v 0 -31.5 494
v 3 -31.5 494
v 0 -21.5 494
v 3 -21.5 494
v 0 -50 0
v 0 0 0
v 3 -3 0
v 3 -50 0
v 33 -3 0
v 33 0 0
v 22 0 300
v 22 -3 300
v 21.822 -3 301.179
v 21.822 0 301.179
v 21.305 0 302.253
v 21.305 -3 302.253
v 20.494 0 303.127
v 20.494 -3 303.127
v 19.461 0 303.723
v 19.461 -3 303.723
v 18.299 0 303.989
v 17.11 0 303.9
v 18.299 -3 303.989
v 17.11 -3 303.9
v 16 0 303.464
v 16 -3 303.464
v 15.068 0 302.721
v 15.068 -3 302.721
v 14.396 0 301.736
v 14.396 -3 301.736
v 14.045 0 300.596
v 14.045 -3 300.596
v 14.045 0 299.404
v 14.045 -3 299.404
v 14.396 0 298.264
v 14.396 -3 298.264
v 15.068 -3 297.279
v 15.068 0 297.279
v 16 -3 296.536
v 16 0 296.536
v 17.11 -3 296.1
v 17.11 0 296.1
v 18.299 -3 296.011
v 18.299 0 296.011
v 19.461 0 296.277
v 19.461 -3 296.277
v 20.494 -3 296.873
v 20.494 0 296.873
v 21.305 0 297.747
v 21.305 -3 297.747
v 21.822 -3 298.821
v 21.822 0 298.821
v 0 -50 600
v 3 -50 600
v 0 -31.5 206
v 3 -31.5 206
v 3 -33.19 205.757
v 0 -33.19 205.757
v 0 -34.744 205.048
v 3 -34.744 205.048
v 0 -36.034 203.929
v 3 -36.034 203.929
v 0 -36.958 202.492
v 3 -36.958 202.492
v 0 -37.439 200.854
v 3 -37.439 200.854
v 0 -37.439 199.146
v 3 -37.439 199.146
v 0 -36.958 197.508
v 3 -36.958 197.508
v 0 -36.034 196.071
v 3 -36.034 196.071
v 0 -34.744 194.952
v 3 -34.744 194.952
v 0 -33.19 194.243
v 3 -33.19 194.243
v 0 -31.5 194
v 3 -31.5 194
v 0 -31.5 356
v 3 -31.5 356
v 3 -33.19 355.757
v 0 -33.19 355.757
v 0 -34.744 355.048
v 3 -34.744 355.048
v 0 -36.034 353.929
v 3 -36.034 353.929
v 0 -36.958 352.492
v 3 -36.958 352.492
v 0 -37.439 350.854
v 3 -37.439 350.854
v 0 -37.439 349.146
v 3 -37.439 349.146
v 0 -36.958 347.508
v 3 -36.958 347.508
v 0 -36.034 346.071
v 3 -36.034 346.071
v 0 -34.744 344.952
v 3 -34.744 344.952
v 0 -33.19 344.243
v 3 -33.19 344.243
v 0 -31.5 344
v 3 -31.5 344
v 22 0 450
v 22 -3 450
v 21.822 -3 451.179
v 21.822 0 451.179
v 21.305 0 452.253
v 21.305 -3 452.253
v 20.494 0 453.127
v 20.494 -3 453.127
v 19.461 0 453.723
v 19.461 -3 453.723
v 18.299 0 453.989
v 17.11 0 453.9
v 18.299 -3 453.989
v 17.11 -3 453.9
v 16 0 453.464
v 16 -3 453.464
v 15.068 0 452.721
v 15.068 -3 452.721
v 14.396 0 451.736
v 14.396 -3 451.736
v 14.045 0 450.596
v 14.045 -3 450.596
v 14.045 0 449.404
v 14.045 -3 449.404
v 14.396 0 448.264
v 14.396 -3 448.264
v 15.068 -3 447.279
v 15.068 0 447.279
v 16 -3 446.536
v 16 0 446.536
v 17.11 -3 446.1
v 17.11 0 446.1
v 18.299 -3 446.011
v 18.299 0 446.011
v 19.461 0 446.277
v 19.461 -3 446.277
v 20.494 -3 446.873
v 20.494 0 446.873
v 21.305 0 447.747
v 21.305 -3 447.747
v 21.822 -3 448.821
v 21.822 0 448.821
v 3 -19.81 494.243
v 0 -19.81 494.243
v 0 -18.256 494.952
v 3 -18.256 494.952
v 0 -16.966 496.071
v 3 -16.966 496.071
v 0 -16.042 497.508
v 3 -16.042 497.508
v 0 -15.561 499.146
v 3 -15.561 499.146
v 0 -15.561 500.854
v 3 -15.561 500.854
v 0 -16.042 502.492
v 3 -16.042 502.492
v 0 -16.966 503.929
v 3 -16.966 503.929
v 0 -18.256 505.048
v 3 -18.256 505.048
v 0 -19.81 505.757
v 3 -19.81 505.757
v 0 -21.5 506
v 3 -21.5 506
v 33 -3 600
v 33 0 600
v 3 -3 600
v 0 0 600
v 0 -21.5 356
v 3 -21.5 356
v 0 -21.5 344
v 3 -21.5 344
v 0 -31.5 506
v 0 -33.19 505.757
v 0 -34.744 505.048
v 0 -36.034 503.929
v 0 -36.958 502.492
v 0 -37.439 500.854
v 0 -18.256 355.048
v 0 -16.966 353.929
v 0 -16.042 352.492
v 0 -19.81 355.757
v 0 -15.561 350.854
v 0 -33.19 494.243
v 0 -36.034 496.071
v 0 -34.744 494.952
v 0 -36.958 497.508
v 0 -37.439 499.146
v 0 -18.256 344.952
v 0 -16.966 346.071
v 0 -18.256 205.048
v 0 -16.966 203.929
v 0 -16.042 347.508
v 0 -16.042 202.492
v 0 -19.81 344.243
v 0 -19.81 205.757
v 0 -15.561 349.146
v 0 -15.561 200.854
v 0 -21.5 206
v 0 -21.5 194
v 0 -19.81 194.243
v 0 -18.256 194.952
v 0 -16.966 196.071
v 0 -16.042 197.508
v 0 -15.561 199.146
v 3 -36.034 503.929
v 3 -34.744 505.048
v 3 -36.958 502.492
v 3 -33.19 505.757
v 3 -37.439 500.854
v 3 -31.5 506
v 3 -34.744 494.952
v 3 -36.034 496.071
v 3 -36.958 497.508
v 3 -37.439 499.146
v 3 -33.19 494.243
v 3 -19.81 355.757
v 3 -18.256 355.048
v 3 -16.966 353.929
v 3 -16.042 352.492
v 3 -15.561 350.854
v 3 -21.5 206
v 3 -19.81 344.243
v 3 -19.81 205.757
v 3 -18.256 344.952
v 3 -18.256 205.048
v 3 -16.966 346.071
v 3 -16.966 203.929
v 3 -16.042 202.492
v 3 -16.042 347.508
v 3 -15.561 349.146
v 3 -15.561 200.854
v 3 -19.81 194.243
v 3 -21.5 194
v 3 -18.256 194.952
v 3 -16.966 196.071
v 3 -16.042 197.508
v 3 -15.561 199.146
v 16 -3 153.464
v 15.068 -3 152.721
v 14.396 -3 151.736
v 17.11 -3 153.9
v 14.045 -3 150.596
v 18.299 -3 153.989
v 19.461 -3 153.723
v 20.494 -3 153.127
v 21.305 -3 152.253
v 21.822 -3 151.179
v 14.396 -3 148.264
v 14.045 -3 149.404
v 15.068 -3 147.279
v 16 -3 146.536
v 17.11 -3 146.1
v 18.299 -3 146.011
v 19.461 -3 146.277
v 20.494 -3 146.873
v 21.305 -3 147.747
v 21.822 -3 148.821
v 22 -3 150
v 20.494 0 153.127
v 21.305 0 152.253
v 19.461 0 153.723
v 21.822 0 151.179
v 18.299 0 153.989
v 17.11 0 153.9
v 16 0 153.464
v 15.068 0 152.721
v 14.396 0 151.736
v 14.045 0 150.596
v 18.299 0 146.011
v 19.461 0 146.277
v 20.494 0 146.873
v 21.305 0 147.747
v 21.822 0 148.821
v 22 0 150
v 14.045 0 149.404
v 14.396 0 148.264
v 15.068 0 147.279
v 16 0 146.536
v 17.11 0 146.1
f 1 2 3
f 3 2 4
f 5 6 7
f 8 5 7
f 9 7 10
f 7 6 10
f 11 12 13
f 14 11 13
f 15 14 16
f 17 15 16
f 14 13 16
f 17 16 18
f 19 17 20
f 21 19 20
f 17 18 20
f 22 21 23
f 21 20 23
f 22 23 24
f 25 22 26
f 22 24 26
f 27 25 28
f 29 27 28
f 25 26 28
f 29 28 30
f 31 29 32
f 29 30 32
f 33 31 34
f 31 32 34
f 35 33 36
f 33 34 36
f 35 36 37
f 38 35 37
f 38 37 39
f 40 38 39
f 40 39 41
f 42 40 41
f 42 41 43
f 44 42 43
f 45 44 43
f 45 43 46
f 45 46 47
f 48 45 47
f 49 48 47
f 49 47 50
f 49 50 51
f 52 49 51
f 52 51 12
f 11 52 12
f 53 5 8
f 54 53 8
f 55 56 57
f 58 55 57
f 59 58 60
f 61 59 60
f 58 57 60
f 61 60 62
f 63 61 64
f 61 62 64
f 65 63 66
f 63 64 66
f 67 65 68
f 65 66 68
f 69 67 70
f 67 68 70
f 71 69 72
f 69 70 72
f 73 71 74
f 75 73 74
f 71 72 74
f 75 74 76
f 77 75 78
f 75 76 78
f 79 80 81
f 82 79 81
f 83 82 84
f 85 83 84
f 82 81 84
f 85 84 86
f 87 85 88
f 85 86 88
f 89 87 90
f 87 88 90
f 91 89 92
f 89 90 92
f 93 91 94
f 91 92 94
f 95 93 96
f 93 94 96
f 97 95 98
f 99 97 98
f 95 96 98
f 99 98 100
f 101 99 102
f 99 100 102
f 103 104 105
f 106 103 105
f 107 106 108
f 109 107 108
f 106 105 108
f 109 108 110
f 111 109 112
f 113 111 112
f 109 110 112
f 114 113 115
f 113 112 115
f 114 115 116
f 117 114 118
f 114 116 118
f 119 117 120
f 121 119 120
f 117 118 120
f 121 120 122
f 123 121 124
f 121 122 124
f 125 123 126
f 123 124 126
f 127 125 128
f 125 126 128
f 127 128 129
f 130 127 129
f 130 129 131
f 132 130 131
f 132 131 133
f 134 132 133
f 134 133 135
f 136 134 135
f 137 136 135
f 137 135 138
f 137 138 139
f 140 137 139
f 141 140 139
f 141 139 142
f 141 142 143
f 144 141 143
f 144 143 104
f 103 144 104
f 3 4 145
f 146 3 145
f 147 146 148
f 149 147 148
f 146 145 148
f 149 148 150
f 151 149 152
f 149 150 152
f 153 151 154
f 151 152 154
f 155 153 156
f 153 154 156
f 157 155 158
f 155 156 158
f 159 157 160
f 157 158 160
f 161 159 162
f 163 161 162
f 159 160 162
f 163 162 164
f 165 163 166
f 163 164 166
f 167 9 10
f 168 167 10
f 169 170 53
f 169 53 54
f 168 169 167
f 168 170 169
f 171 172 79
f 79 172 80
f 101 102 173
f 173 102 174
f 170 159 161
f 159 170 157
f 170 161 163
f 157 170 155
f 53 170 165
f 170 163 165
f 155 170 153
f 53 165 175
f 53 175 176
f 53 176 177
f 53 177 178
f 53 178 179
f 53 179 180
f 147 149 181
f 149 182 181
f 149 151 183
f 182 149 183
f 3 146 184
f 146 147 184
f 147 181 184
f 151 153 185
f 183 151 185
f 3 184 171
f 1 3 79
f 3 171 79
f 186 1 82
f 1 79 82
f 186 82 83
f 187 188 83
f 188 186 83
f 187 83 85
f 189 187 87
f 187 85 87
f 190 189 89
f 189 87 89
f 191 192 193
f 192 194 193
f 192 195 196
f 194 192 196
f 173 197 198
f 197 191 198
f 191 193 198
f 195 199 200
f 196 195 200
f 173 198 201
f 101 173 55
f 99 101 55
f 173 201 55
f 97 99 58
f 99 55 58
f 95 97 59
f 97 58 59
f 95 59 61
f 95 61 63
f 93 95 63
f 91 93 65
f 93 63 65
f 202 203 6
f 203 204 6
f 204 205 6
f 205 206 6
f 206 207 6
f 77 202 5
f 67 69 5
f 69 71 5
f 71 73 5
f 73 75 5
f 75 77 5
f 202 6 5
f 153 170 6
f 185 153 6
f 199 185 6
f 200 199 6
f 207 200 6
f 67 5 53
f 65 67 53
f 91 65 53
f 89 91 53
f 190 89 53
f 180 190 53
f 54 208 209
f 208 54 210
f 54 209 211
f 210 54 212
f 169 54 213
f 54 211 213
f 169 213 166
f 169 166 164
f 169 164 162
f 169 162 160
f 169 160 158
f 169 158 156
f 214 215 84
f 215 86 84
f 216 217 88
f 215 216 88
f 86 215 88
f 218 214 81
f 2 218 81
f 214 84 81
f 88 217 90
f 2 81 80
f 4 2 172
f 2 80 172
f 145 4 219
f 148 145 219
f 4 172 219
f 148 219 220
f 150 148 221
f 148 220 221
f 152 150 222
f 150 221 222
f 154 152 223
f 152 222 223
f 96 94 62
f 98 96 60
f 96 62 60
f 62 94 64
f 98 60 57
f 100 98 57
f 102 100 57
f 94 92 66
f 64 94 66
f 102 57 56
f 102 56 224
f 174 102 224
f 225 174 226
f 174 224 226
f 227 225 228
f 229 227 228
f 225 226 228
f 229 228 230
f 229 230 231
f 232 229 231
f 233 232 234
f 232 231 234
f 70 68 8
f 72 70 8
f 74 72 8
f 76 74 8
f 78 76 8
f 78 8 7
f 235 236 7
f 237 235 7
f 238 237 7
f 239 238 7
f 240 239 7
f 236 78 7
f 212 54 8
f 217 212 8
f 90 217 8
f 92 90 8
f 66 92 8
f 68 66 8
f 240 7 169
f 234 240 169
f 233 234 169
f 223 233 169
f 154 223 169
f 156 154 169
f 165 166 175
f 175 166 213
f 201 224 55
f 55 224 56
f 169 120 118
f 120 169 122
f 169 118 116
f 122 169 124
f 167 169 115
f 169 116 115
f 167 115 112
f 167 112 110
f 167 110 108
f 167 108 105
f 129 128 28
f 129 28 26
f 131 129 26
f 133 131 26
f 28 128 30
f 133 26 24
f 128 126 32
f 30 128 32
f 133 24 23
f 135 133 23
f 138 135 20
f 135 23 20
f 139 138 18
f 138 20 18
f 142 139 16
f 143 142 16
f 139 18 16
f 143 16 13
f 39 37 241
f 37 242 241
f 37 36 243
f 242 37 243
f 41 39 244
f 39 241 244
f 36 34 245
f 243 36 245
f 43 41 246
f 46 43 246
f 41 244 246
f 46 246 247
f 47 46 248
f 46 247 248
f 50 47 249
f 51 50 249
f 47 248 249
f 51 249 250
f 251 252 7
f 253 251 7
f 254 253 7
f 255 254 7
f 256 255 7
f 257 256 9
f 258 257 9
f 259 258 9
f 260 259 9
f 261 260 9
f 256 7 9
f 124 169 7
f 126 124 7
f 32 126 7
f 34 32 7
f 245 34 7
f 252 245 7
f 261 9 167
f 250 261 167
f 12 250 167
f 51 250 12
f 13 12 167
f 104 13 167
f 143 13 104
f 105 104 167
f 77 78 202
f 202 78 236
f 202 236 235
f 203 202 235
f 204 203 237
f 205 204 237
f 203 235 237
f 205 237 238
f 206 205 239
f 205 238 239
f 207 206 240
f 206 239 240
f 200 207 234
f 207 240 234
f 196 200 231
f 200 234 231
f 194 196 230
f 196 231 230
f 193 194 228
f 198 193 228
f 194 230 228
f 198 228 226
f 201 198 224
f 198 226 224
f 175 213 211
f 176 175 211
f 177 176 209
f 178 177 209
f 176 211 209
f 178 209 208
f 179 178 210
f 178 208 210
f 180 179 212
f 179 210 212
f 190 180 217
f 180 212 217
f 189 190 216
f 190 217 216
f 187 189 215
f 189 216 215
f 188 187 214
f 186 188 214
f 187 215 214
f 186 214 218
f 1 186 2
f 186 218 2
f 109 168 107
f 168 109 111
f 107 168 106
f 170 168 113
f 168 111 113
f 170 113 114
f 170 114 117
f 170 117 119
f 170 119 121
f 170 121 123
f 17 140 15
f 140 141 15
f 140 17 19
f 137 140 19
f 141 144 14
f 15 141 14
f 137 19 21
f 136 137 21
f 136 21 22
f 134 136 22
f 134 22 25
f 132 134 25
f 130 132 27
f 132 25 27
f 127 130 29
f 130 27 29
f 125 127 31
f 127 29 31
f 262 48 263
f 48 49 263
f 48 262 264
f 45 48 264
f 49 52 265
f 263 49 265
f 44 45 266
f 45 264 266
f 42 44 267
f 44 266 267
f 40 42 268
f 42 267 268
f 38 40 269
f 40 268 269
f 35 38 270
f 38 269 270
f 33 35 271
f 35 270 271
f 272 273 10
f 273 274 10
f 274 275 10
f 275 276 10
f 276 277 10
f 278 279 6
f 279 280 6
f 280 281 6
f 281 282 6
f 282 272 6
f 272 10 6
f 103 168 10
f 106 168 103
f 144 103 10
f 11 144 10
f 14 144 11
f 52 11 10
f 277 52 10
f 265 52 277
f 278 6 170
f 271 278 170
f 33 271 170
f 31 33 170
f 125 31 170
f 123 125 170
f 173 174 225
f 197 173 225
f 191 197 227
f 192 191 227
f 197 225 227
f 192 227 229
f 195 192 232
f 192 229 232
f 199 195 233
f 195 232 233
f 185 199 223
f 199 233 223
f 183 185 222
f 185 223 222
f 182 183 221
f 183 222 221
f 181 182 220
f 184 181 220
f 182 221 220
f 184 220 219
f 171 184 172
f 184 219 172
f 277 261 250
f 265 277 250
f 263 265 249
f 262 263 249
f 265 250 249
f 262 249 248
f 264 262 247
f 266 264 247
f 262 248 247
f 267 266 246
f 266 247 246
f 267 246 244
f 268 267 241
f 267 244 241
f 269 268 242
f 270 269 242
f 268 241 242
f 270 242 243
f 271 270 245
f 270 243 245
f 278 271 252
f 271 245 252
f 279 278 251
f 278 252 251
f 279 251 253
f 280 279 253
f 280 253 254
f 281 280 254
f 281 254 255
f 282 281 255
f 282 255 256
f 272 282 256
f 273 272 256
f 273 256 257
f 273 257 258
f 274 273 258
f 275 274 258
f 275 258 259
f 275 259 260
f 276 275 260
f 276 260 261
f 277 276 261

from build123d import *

# Parameters (mm, degrees)
F1_DEPTH = 600
F2_R     = 4
F3_DEPTH = 3.001
F5_DEPTH = 3.001


with BuildPart() as f1:
    # F0 (on Top) → F1 (new body)
    with BuildSketch(Plane.XY):
        Polygon((33, 0), (0, 0), (0, -50), (3, -50), (3, -3), (33, -3), align=None)
    extrude(amount=F1_DEPTH)

    # F2 (on face) → F3 (cut, through all)
    with BuildSketch(Plane.XZ.offset(3)):
        with Locations((18, 150)):
            Circle(F2_R)
        with Locations((18, 300)):
            Circle(F2_R)
        with Locations((18, 450)):
            Circle(F2_R)
    extrude(amount=-F3_DEPTH, mode=Mode.SUBTRACT)

    # F4 (on face) → F5 (cut, through all)
    with BuildSketch(Plane.YZ.offset(3)):
        with BuildLine():
            Line((-21.5, 506), (-31.5, 506))
            ThreePointArc((-31.5, 506), (-37.5, 500), (-31.5, 494))
            Line((-31.5, 494), (-21.5, 494))
            ThreePointArc((-21.5, 494), (-15.5, 500), (-21.5, 506))
        make_face()
        with BuildLine():
            Line((-21.5, 356), (-31.5, 356))
            ThreePointArc((-31.5, 356), (-37.5, 350), (-31.5, 344))
            Line((-31.5, 344), (-21.5, 344))
            ThreePointArc((-21.5, 344), (-15.5, 350), (-21.5, 356))
        make_face()
        with BuildLine():
            Line((-21.5, 206), (-31.5, 206))
            ThreePointArc((-31.5, 206), (-37.5, 200), (-31.5, 194))
            Line((-31.5, 194), (-21.5, 194))
            ThreePointArc((-21.5, 194), (-15.5, 200), (-21.5, 206))
        make_face()
    extrude(amount=-F5_DEPTH, mode=Mode.SUBTRACT)


solid = f1.part
